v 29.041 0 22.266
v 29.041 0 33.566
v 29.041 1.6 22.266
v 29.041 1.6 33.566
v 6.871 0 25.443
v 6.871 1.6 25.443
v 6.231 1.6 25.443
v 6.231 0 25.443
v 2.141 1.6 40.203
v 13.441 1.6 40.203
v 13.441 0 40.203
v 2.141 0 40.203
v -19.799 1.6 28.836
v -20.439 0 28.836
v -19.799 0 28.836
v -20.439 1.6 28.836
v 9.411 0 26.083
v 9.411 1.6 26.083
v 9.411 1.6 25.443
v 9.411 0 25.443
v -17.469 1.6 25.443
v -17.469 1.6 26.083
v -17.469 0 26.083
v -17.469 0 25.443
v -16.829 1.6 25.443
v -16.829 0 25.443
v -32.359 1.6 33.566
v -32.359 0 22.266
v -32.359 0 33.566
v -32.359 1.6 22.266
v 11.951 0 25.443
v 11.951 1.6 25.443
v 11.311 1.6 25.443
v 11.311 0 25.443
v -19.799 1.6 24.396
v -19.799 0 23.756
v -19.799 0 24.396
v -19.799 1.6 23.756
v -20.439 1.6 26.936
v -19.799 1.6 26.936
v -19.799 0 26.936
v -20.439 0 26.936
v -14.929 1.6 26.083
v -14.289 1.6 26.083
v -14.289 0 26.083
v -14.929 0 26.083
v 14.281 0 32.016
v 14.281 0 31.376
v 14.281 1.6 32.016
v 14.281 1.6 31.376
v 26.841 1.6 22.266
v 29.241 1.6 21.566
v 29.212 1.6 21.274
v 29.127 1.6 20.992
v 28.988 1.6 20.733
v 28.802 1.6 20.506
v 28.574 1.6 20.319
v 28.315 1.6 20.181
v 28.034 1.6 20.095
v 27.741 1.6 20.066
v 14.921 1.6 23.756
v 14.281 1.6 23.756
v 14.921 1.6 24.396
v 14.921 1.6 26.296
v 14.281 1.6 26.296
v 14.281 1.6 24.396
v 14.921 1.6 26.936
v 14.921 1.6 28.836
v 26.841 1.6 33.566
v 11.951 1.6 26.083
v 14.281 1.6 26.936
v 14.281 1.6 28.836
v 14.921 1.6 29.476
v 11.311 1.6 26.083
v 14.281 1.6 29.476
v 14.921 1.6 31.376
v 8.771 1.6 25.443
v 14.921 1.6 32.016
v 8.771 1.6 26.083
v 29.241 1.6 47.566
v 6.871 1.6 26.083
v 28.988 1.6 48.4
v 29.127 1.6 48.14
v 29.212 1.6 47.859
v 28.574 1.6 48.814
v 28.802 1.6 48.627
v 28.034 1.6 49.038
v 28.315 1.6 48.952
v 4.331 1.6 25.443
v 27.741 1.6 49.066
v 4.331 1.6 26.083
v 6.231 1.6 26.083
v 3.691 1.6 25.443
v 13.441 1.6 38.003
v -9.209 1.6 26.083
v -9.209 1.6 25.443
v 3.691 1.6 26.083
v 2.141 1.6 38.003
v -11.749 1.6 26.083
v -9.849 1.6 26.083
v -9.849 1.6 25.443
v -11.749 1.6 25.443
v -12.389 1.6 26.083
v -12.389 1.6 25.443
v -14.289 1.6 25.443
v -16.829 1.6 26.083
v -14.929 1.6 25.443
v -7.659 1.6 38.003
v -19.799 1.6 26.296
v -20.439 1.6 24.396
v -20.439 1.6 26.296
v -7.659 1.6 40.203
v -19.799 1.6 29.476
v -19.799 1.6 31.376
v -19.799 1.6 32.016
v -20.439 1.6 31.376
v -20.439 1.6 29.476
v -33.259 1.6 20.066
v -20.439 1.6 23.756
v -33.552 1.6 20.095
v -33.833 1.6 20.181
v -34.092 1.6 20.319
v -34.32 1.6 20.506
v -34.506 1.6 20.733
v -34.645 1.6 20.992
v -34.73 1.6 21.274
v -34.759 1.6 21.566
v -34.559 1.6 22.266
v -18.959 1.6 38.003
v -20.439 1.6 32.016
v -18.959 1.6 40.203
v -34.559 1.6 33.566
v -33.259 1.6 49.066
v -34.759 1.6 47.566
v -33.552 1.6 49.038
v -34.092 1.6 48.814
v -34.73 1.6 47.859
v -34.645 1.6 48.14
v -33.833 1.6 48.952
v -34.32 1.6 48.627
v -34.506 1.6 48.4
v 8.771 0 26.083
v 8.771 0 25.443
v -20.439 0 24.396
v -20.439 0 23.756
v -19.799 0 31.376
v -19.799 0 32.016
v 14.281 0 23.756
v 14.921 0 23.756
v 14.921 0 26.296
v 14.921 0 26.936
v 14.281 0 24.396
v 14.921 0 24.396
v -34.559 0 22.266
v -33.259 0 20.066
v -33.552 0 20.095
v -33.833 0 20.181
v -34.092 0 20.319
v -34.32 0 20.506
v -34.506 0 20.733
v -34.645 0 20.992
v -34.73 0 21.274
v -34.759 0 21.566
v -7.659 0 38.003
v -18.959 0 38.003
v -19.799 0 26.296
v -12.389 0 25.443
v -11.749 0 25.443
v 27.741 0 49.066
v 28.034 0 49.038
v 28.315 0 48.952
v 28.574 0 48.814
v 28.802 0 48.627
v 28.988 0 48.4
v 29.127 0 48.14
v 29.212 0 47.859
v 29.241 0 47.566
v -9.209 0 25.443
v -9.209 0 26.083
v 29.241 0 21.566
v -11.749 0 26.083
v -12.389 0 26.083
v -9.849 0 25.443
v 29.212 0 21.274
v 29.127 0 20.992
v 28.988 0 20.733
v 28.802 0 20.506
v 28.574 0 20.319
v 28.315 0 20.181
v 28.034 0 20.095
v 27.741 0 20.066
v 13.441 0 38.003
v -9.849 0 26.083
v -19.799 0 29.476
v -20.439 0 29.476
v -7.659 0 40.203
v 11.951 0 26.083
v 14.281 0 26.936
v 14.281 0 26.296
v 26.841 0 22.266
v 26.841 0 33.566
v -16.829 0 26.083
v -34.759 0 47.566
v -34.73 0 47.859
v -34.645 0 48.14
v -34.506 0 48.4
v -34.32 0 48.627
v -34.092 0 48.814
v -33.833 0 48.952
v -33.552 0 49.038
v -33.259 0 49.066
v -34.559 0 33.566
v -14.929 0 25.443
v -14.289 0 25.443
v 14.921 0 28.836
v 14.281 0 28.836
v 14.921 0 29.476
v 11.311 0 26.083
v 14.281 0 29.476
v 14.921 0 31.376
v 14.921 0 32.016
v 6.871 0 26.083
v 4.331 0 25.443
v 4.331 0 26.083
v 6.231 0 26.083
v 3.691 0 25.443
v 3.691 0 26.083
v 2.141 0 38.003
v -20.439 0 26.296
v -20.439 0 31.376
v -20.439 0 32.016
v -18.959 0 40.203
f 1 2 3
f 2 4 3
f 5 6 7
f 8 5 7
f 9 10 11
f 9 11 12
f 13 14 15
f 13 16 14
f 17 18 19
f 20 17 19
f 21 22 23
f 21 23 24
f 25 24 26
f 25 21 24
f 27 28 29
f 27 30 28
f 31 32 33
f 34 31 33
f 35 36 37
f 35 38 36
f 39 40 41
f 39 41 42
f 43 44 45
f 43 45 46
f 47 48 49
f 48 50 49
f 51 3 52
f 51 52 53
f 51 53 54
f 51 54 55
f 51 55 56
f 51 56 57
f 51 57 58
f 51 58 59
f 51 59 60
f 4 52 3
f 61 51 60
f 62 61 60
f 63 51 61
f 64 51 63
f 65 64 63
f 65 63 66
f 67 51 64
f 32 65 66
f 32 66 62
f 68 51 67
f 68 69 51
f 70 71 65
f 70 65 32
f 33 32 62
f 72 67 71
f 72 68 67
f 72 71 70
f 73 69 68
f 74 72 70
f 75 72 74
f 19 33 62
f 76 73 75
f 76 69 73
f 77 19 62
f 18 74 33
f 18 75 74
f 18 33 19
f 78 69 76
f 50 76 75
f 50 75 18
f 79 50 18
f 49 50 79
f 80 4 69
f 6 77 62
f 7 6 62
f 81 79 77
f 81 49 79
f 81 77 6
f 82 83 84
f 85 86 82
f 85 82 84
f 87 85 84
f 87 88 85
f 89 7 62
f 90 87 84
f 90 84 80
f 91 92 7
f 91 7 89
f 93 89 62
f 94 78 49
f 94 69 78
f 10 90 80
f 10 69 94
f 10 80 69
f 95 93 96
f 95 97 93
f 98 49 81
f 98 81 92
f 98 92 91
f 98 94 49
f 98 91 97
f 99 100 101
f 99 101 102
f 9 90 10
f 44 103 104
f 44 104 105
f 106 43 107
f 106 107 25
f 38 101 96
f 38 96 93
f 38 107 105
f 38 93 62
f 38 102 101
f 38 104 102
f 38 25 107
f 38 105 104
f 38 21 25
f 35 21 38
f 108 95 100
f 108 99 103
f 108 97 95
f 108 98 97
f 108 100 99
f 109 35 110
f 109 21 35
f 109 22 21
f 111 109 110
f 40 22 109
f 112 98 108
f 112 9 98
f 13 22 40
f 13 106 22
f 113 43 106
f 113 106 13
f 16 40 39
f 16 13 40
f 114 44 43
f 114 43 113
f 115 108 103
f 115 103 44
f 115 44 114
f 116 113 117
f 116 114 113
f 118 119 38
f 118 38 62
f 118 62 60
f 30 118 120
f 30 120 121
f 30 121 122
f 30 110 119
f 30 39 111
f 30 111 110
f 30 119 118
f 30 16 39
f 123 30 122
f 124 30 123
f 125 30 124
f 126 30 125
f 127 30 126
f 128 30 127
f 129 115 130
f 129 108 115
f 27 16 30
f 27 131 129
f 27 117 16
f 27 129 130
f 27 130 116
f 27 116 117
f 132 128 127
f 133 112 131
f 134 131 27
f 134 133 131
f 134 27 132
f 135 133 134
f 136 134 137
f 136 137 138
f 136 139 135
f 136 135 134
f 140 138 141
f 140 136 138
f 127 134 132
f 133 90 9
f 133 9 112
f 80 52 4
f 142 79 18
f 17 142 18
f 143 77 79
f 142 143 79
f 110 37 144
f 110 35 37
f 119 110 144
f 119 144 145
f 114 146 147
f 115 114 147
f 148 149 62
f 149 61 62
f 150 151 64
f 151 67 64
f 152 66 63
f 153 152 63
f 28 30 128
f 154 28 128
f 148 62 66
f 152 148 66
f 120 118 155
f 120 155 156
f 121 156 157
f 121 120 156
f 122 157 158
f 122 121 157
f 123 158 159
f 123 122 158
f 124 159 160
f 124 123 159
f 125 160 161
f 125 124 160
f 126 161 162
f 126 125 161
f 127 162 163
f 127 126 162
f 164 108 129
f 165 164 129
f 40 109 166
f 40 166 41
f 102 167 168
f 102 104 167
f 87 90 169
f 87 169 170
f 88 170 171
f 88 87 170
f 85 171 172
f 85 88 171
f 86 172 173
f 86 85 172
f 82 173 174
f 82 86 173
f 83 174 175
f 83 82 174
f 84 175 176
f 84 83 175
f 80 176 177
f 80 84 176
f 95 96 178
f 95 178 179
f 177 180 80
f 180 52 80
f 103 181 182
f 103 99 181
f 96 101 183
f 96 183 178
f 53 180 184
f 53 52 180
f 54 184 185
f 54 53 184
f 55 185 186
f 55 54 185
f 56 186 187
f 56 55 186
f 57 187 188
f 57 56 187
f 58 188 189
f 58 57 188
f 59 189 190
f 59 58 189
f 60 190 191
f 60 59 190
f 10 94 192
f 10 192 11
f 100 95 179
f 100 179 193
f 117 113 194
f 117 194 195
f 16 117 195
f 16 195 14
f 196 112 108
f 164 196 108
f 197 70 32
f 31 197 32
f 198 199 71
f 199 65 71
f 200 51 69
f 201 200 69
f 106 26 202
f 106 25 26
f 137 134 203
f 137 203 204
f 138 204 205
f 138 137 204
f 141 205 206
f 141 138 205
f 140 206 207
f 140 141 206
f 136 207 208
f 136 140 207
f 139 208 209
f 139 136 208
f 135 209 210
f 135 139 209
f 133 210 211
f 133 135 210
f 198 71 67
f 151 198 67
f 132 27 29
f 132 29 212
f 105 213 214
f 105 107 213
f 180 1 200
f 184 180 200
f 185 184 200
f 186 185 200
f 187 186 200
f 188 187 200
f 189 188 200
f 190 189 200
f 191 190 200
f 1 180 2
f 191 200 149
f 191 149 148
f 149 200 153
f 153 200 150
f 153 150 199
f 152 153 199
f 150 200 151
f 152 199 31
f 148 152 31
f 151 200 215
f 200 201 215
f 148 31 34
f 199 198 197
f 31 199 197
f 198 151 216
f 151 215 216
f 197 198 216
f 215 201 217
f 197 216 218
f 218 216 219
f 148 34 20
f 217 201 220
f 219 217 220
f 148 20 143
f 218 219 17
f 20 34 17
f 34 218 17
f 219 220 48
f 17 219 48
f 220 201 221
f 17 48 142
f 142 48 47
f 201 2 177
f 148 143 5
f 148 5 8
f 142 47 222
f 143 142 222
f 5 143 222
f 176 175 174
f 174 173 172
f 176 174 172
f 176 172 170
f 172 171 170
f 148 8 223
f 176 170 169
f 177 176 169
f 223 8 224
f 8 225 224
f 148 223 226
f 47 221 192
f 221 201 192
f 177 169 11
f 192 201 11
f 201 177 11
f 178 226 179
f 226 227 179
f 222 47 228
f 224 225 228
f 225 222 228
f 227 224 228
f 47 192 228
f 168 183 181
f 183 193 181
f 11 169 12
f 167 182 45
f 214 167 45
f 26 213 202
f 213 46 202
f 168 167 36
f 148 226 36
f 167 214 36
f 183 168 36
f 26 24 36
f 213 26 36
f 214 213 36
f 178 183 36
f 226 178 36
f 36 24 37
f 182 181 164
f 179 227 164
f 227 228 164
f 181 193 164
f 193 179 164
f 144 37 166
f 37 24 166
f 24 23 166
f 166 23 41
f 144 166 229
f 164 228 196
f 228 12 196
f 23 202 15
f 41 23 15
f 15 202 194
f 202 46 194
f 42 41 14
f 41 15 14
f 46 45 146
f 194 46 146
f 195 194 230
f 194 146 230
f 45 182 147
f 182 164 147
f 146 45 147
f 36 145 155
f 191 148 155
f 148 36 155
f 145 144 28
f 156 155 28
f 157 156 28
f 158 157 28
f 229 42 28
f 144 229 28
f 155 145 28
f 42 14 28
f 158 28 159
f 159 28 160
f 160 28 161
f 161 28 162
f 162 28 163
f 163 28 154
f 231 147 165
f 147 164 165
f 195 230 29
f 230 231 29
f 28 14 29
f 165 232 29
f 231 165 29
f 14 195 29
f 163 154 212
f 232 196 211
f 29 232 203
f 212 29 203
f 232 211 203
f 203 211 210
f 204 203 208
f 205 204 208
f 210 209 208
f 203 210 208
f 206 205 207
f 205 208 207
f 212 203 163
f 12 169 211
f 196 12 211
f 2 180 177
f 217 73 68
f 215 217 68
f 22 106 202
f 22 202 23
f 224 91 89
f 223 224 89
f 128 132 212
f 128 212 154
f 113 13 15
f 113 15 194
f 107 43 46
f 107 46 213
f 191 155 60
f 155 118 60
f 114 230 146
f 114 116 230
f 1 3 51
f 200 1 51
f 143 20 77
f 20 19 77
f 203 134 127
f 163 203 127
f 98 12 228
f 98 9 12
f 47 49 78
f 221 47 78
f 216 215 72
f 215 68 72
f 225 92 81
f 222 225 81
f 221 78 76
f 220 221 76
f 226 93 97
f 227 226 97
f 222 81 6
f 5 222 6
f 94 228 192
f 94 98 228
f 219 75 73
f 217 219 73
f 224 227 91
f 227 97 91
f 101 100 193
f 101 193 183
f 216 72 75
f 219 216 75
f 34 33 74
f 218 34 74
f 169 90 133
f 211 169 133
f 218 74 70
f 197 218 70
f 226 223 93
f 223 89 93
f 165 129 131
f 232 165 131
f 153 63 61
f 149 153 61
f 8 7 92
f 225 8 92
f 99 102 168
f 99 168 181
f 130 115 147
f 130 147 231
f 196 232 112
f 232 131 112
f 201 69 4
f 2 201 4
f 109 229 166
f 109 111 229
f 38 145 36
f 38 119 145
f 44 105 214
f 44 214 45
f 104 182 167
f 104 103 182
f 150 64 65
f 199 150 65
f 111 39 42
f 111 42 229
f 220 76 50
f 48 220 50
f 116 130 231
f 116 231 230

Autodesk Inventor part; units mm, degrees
ref_plane "YZ Plane" through (0, 0, 0) normal (1, 0, 0) x (0, 1, 0)
ref_plane "XZ Plane" through (0, 0, 0) normal (0, 1, 0) x (-1, 0, 0)
ref_plane "XY Plane" through (0, 0, 0) normal (0, 0, 1) x (1, 0, 0)
sketch "Szkic1" plane through (0, 0, 0) normal (0, 1, 0) x (-1, 0, 0)
  line L0 (35.259, 49.5664) -> (-29.741, 49.5664)
  line L1 (-29.741, 49.5664) -> (-29.741, 19.5664)
  line L2 (-29.741, 19.5664) -> (35.259, 19.5664)
  line L3 (35.259, 19.5664) -> (35.259, 49.5664)
  point P0 (0, 0)
  dimension "d0" = 65
  dimension "d1" = 30
extrude "Wyciągnięcie proste1" add sketch "Szkic1" along normal blind 1.6
fillet "Zaokrąglenie1" radius 2 4 edges at (-35.259, 0.8, 19.5664) (-35.259, 0.8, 49.5664) (29.741, 0.8, 49.5664) (29.741, 0.8, 19.5664)
sketch "Szkic2" plane through (0, 1.6, 0) normal (0, 1, 0) x (1, 0, 0)
  arc A0 (29.741, -21.5664) -> (27.741, -19.5664) centre (27.741, -21.5664) ccw projected
  line L0 (27.741, -19.5664) -> (-33.259, -19.5664) projected
  arc A1 (-33.259, -19.5664) -> (-35.259, -21.5664) centre (-33.259, -21.5664) ccw projected
  line L1 (-35.259, -21.5664) -> (-35.259, -47.5664) projected
  arc A2 (-35.259, -47.5664) -> (-33.259, -49.5664) centre (-33.259, -47.5664) ccw projected
  line L2 (-33.259, -49.5664) -> (27.741, -49.5664) projected
  arc A3 (27.741, -49.5664) -> (29.741, -47.5664) centre (27.741, -47.5664) ccw projected
  line L3 (29.741, -47.5664) -> (29.741, -21.5664) projected
  line L4 (-33.259, -20.0664) -> (27.741, -20.0664)
  arc A4 (29.241, -21.5664) -> (27.741, -20.0664) centre (27.741, -21.5664) ccw
  line L5 (29.241, -21.5664) -> (29.241, -47.5664)
  arc A5 (27.741, -49.0664) -> (29.241, -47.5664) centre (27.741, -47.5664) ccw
  line L6 (27.741, -49.0664) -> (-33.259, -49.0664)
  arc A6 (-34.759, -47.5664) -> (-33.259, -49.0664) centre (-33.259, -47.5664) ccw
  line L7 (-34.759, -47.5664) -> (-34.759, -21.5664)
  arc A7 (-33.259, -20.0664) -> (-34.759, -21.5664) centre (-33.259, -21.5664) ccw
  point P0 (0, 0)
  dimension "d5" = 0.5
extrude "Wyciągnięcie proste2" cut sketch "Szkic2" against normal through all
sketch "Szkic3" plane through (0, 1.6, 0) normal (0, 1, 0) x (1, 0, 0)
  line L0 (-19.799, -32.0164) -> (-20.439, -32.0164) projected
  line L1 (-20.439, -32.0164) -> (-20.439, -31.3764) projected
  line L2 (-19.799, -31.3764) -> (-19.799, -32.0164) projected
  line L3 (-20.439, -31.3764) -> (-19.799, -31.3764) projected
  line L4 (-19.799, -29.4764) -> (-20.439, -29.4764) projected
  line L5 (-19.799, -28.8364) -> (-19.799, -29.4764) projected
  line L6 (-20.439, -29.4764) -> (-20.439, -28.8364) projected
  line L7 (-20.439, -28.8364) -> (-19.799, -28.8364) projected
  line L8 (-19.799, -26.9364) -> (-20.439, -26.9364) projected
  line L9 (-19.799, -26.2964) -> (-19.799, -26.9364) projected
  line L10 (-20.439, -26.9364) -> (-20.439, -26.2964) projected
  line L11 (-20.439, -26.2964) -> (-19.799, -26.2964) projected
  line L12 (-20.439, -24.3964) -> (-20.439, -23.7564) projected
  line L13 (-19.799, -24.3964) -> (-20.439, -24.3964) projected
  line L14 (-20.439, -23.7564) -> (-19.799, -23.7564) projected
  line L15 (-19.799, -23.7564) -> (-19.799, -24.3964) projected
  line L16 (-17.469, -25.4431) -> (-16.829, -25.4431) projected
  line L17 (-17.469, -26.0831) -> (-17.469, -25.4431) projected
  line L18 (-16.829, -26.0831) -> (-17.469, -26.0831) projected
  line L19 (-16.829, -25.4431) -> (-16.829, -26.0831) projected
  line L20 (-14.929, -26.0831) -> (-14.929, -25.4431) projected
  line L21 (-14.289, -26.0831) -> (-14.929, -26.0831) projected
  line L22 (-14.929, -25.4431) -> (-14.289, -25.4431) projected
  line L23 (-14.289, -25.4431) -> (-14.289, -26.0831) projected
  line L24 (-12.389, -26.0831) -> (-12.389, -25.4431) projected
  line L25 (-11.749, -26.0831) -> (-12.389, -26.0831) projected
  line L26 (-12.389, -25.4431) -> (-11.749, -25.4431) projected
  line L27 (-11.749, -25.4431) -> (-11.749, -26.0831) projected
  line L28 (-9.849, -26.0831) -> (-9.849, -25.4431) projected
  line L29 (-9.209, -25.4431) -> (-9.209, -26.0831) projected
  line L30 (-9.849, -25.4431) -> (-9.209, -25.4431) projected
  line L31 (-9.209, -26.0831) -> (-9.849, -26.0831) projected
  line L32 (-2.759, -11.5664) -> (-2.759, -67.5664)
  line L33 (-34.259, -33.2664) -> (-32.659, -33.2664) projected
  line L34 (-34.259, -33.2664) -> (-34.259, -22.5664) projected
  line L35 (-34.259, -22.5664) -> (-32.659, -22.5664) projected
  line L36 (-32.659, -22.5664) -> (-32.659, -33.2664) projected
  line L37 (-34.259, -33.2664) -> (-32.659, -33.2664) projected
  line L38 (-7.959, -39.9031) -> (-18.659, -39.9031) projected
  line L39 (-18.659, -39.9031) -> (-18.659, -38.3031) projected
  line L40 (-18.659, -38.3031) -> (-7.959, -38.3031) projected
  line L41 (-7.959, -39.9031) -> (-7.959, -38.3031) projected
  line L42 (2.441, -39.9031) -> (13.141, -39.9031) projected
  line L43 (2.441, -39.9031) -> (2.441, -38.3031) projected
  line L44 (13.141, -38.3031) -> (2.441, -38.3031) projected
  line L45 (13.141, -39.9031) -> (13.141, -38.3031) projected
  line L46 (28.741, -33.2664) -> (28.741, -22.5664) projected
  line L47 (28.741, -33.2664) -> (27.141, -33.2664) projected
  line L48 (27.141, -22.5664) -> (27.141, -33.2664) projected
  line L49 (28.741, -22.5664) -> (27.141, -22.5664) projected
  line L50 (14.281, -32.0164) -> (14.921, -32.0164)
  line L51 (14.921, -32.0164) -> (14.921, -31.3764)
  line L52 (14.281, -31.3764) -> (14.281, -32.0164)
  line L53 (14.921, -31.3764) -> (14.281, -31.3764)
  line L54 (14.281, -29.4764) -> (14.921, -29.4764)
  line L55 (14.281, -28.8364) -> (14.281, -29.4764)
  line L56 (14.921, -29.4764) -> (14.921, -28.8364)
  line L57 (14.921, -28.8364) -> (14.281, -28.8364)
  line L58 (14.281, -26.9364) -> (14.921, -26.9364)
  line L59 (14.281, -26.2964) -> (14.281, -26.9364)
  line L60 (14.921, -26.9364) -> (14.921, -26.2964)
  line L61 (14.921, -26.2964) -> (14.281, -26.2964)
  line L62 (14.921, -24.3964) -> (14.921, -23.7564)
  line L63 (14.281, -24.3964) -> (14.921, -24.3964)
  line L64 (14.921, -23.7564) -> (14.281, -23.7564)
  line L65 (14.281, -23.7564) -> (14.281, -24.3964)
  line L66 (11.951, -25.4431) -> (11.311, -25.4431)
  line L67 (11.951, -26.0831) -> (11.951, -25.4431)
  line L68 (11.311, -26.0831) -> (11.951, -26.0831)
  line L69 (11.311, -25.4431) -> (11.311, -26.0831)
  line L70 (9.411, -26.0831) -> (9.411, -25.4431)
  line L71 (8.771, -26.0831) -> (9.411, -26.0831)
  line L72 (9.411, -25.4431) -> (8.771, -25.4431)
  line L73 (8.771, -25.4431) -> (8.771, -26.0831)
  line L74 (6.871, -26.0831) -> (6.871, -25.4431)
  line L75 (6.231, -26.0831) -> (6.871, -26.0831)
  line L76 (6.871, -25.4431) -> (6.231, -25.4431)
  line L77 (6.231, -25.4431) -> (6.231, -26.0831)
  line L78 (4.331, -26.0831) -> (4.331, -25.4431)
  line L79 (3.691, -25.4431) -> (3.691, -26.0831)
  line L80 (4.331, -25.4431) -> (3.691, -25.4431)
  line L81 (3.691, -26.0831) -> (4.331, -26.0831)
  arc A0 (-33.259, -20.0664) -> (-34.759, -21.5664) centre (-33.259, -21.5664) ccw projected
  line L82 (-34.759, -21.5664) -> (-34.759, -47.5664) projected
  arc A1 (-34.759, -47.5664) -> (-33.259, -49.0664) centre (-33.259, -47.5664) ccw projected
  line L83 (-33.259, -49.0664) -> (27.741, -49.0664) projected
  arc A2 (27.741, -49.0664) -> (29.241, -47.5664) centre (27.741, -47.5664) ccw projected
  line L84 (29.241, -47.5664) -> (29.241, -21.5664) projected
  arc A3 (29.241, -21.5664) -> (27.741, -20.0664) centre (27.741, -21.5664) ccw projected
  line L85 (27.741, -20.0664) -> (-33.259, -20.0664) projected
  line L86 (-32.359, -33.2664) -> (-32.359, -22.2664)
  line L87 (-32.359, -22.2664) -> (-34.559, -22.2664)
  line L88 (-34.559, -22.2664) -> (-34.559, -33.2664)
  line L89 (-34.259, -33.5664) -> (-32.659, -33.5664)
  line L90 (-34.559, -22.2664) -> (-32.359, -22.2664)
  line L91 (-32.359, -22.2664) -> (-32.359, -33.5664)
  line L92 (-32.359, -33.5664) -> (-34.559, -33.5664)
  line L93 (-34.559, -33.5664) -> (-34.559, -22.2664)
  line L94 (-18.959, -40.2031) -> (-7.659, -40.2031)
  line L95 (-7.659, -40.2031) -> (-7.659, -38.0031)
  line L96 (-7.659, -38.0031) -> (-18.959, -38.0031)
  line L97 (-18.959, -38.0031) -> (-18.959, -40.2031)
  line L98 (13.441, -40.2031) -> (2.141, -40.2031)
  line L99 (2.141, -40.2031) -> (2.141, -38.0031)
  line L100 (2.141, -38.0031) -> (13.441, -38.0031)
  line L101 (13.441, -38.0031) -> (13.441, -40.2031)
  line L102 (26.841, -33.5664) -> (29.041, -33.5664)
  line L103 (29.041, -33.5664) -> (29.041, -22.2664)
  line L104 (29.041, -22.2664) -> (26.841, -22.2664)
  line L105 (26.841, -22.2664) -> (26.841, -33.5664)
  point P0 (0, 0)
  dimension "d8" = 0.3
  dimension "d9" = 0.3
  dimension "d10" = 0.3
  dimension "d11" = 0.3
  dimension "d12" = 0.3
extrude "Wyciągnięcie proste3" cut sketch "Szkic3" against normal through all contours L0 L1 L3 L2 | L4 L6 L7 L5 | L8 L10 L11 L9 | L12 L14 L15 L13 | L16 L19 L18 L17 | L20 L22 L23 L21 | L24 L26 L27 L25 | L28 L30 L29 L31 | L34 L35 L36 L33 | L38 L39 L40 L41 | L43 L44 L45 L42 | L47 L48 L49 L46 | L52 L53 L51 L50 | L55 L57 L56 L54 | L59 L61 L60 L58 | L63 L65 L64 L62 | L67 L68 L69 L66 | L71 L73 L72 L70 | L75 L77 L76 L74 | L81 L79 L80 L78 | L91 L92 L89 L93 L88 L87 L86 | L97 L96 L95 L94 | L98 L99 L100 L101 | L105 L104 L103 L102
properties part number "MS_PCB"
